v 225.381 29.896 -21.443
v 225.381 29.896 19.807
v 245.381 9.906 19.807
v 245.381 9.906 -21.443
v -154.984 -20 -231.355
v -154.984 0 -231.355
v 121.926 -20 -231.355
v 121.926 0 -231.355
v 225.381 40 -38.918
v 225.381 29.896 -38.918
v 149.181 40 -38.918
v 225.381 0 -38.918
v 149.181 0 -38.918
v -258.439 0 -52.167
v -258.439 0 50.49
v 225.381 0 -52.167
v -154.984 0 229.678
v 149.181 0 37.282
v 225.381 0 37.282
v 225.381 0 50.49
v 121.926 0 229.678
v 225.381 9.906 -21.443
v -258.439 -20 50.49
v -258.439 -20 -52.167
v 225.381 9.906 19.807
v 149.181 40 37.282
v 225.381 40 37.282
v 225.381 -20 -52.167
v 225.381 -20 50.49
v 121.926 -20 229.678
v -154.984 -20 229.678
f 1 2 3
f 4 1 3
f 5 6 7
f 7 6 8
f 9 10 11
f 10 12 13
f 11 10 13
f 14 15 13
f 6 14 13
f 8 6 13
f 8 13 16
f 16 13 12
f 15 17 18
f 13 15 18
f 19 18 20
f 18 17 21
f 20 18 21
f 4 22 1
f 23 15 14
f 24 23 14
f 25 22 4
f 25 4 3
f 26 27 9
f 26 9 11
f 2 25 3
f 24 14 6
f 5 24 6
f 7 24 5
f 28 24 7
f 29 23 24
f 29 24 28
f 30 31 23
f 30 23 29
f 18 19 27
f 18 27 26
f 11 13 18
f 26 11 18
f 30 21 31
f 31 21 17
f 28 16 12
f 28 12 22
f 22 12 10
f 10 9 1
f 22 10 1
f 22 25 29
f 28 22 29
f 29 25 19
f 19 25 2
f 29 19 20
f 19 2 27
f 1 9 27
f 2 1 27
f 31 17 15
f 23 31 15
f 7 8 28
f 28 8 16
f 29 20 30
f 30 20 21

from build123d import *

# Parameters (mm, degrees)
F1_DEPTH = 20
F2_W     = 76.2
F2_H     = 76.2
F3_DEPTH = 40
F4_W     = 19.9898
F4_H     = 41.2496
F5_DEPTH = 20
F7_DEPTH = 251.162639


with BuildPart() as f1:
    # F0 (on Front) → F1 (new body)
    with BuildSketch(Plane.XZ):
        Polygon((121.926413, 229.678165), (-154.984387, 229.678165), (-258.438587, 50.490234), (-258.438587, -52.166674), (-154.984387, -231.354605), (121.926413, -231.354605), (225.380613, -52.166674), (225.380613, 50.490234), align=None)
    extrude(amount=F1_DEPTH)

    # F2 (on face) → F3 (join)
    with BuildSketch(Plane(origin=(0, 0, 0), x_dir=(-1, 0, 0), z_dir=(0, 1, 0))):
        with Locations((-187.280613, -0.817766)):
            Rectangle(F2_W, F2_H)
    extrude(amount=F3_DEPTH)

    # F4 (on face) → F5 (join)
    with BuildSketch(Plane.YZ.offset(225.380613)):
        with Locations((19.9009, -0.817766)):
            Rectangle(F4_W, F4_H)
    extrude(amount=F5_DEPTH)

    # F6 (on face) → F7 (cut, through all)
    with BuildSketch(Plane.XY.offset(19.807034)):
        Polygon((245.380613, 29.8958), (225.380613, 29.8958), (245.380613, 9.906), align=None)
    extrude(amount=-F7_DEPTH, mode=Mode.SUBTRACT)


solid = f1.part
